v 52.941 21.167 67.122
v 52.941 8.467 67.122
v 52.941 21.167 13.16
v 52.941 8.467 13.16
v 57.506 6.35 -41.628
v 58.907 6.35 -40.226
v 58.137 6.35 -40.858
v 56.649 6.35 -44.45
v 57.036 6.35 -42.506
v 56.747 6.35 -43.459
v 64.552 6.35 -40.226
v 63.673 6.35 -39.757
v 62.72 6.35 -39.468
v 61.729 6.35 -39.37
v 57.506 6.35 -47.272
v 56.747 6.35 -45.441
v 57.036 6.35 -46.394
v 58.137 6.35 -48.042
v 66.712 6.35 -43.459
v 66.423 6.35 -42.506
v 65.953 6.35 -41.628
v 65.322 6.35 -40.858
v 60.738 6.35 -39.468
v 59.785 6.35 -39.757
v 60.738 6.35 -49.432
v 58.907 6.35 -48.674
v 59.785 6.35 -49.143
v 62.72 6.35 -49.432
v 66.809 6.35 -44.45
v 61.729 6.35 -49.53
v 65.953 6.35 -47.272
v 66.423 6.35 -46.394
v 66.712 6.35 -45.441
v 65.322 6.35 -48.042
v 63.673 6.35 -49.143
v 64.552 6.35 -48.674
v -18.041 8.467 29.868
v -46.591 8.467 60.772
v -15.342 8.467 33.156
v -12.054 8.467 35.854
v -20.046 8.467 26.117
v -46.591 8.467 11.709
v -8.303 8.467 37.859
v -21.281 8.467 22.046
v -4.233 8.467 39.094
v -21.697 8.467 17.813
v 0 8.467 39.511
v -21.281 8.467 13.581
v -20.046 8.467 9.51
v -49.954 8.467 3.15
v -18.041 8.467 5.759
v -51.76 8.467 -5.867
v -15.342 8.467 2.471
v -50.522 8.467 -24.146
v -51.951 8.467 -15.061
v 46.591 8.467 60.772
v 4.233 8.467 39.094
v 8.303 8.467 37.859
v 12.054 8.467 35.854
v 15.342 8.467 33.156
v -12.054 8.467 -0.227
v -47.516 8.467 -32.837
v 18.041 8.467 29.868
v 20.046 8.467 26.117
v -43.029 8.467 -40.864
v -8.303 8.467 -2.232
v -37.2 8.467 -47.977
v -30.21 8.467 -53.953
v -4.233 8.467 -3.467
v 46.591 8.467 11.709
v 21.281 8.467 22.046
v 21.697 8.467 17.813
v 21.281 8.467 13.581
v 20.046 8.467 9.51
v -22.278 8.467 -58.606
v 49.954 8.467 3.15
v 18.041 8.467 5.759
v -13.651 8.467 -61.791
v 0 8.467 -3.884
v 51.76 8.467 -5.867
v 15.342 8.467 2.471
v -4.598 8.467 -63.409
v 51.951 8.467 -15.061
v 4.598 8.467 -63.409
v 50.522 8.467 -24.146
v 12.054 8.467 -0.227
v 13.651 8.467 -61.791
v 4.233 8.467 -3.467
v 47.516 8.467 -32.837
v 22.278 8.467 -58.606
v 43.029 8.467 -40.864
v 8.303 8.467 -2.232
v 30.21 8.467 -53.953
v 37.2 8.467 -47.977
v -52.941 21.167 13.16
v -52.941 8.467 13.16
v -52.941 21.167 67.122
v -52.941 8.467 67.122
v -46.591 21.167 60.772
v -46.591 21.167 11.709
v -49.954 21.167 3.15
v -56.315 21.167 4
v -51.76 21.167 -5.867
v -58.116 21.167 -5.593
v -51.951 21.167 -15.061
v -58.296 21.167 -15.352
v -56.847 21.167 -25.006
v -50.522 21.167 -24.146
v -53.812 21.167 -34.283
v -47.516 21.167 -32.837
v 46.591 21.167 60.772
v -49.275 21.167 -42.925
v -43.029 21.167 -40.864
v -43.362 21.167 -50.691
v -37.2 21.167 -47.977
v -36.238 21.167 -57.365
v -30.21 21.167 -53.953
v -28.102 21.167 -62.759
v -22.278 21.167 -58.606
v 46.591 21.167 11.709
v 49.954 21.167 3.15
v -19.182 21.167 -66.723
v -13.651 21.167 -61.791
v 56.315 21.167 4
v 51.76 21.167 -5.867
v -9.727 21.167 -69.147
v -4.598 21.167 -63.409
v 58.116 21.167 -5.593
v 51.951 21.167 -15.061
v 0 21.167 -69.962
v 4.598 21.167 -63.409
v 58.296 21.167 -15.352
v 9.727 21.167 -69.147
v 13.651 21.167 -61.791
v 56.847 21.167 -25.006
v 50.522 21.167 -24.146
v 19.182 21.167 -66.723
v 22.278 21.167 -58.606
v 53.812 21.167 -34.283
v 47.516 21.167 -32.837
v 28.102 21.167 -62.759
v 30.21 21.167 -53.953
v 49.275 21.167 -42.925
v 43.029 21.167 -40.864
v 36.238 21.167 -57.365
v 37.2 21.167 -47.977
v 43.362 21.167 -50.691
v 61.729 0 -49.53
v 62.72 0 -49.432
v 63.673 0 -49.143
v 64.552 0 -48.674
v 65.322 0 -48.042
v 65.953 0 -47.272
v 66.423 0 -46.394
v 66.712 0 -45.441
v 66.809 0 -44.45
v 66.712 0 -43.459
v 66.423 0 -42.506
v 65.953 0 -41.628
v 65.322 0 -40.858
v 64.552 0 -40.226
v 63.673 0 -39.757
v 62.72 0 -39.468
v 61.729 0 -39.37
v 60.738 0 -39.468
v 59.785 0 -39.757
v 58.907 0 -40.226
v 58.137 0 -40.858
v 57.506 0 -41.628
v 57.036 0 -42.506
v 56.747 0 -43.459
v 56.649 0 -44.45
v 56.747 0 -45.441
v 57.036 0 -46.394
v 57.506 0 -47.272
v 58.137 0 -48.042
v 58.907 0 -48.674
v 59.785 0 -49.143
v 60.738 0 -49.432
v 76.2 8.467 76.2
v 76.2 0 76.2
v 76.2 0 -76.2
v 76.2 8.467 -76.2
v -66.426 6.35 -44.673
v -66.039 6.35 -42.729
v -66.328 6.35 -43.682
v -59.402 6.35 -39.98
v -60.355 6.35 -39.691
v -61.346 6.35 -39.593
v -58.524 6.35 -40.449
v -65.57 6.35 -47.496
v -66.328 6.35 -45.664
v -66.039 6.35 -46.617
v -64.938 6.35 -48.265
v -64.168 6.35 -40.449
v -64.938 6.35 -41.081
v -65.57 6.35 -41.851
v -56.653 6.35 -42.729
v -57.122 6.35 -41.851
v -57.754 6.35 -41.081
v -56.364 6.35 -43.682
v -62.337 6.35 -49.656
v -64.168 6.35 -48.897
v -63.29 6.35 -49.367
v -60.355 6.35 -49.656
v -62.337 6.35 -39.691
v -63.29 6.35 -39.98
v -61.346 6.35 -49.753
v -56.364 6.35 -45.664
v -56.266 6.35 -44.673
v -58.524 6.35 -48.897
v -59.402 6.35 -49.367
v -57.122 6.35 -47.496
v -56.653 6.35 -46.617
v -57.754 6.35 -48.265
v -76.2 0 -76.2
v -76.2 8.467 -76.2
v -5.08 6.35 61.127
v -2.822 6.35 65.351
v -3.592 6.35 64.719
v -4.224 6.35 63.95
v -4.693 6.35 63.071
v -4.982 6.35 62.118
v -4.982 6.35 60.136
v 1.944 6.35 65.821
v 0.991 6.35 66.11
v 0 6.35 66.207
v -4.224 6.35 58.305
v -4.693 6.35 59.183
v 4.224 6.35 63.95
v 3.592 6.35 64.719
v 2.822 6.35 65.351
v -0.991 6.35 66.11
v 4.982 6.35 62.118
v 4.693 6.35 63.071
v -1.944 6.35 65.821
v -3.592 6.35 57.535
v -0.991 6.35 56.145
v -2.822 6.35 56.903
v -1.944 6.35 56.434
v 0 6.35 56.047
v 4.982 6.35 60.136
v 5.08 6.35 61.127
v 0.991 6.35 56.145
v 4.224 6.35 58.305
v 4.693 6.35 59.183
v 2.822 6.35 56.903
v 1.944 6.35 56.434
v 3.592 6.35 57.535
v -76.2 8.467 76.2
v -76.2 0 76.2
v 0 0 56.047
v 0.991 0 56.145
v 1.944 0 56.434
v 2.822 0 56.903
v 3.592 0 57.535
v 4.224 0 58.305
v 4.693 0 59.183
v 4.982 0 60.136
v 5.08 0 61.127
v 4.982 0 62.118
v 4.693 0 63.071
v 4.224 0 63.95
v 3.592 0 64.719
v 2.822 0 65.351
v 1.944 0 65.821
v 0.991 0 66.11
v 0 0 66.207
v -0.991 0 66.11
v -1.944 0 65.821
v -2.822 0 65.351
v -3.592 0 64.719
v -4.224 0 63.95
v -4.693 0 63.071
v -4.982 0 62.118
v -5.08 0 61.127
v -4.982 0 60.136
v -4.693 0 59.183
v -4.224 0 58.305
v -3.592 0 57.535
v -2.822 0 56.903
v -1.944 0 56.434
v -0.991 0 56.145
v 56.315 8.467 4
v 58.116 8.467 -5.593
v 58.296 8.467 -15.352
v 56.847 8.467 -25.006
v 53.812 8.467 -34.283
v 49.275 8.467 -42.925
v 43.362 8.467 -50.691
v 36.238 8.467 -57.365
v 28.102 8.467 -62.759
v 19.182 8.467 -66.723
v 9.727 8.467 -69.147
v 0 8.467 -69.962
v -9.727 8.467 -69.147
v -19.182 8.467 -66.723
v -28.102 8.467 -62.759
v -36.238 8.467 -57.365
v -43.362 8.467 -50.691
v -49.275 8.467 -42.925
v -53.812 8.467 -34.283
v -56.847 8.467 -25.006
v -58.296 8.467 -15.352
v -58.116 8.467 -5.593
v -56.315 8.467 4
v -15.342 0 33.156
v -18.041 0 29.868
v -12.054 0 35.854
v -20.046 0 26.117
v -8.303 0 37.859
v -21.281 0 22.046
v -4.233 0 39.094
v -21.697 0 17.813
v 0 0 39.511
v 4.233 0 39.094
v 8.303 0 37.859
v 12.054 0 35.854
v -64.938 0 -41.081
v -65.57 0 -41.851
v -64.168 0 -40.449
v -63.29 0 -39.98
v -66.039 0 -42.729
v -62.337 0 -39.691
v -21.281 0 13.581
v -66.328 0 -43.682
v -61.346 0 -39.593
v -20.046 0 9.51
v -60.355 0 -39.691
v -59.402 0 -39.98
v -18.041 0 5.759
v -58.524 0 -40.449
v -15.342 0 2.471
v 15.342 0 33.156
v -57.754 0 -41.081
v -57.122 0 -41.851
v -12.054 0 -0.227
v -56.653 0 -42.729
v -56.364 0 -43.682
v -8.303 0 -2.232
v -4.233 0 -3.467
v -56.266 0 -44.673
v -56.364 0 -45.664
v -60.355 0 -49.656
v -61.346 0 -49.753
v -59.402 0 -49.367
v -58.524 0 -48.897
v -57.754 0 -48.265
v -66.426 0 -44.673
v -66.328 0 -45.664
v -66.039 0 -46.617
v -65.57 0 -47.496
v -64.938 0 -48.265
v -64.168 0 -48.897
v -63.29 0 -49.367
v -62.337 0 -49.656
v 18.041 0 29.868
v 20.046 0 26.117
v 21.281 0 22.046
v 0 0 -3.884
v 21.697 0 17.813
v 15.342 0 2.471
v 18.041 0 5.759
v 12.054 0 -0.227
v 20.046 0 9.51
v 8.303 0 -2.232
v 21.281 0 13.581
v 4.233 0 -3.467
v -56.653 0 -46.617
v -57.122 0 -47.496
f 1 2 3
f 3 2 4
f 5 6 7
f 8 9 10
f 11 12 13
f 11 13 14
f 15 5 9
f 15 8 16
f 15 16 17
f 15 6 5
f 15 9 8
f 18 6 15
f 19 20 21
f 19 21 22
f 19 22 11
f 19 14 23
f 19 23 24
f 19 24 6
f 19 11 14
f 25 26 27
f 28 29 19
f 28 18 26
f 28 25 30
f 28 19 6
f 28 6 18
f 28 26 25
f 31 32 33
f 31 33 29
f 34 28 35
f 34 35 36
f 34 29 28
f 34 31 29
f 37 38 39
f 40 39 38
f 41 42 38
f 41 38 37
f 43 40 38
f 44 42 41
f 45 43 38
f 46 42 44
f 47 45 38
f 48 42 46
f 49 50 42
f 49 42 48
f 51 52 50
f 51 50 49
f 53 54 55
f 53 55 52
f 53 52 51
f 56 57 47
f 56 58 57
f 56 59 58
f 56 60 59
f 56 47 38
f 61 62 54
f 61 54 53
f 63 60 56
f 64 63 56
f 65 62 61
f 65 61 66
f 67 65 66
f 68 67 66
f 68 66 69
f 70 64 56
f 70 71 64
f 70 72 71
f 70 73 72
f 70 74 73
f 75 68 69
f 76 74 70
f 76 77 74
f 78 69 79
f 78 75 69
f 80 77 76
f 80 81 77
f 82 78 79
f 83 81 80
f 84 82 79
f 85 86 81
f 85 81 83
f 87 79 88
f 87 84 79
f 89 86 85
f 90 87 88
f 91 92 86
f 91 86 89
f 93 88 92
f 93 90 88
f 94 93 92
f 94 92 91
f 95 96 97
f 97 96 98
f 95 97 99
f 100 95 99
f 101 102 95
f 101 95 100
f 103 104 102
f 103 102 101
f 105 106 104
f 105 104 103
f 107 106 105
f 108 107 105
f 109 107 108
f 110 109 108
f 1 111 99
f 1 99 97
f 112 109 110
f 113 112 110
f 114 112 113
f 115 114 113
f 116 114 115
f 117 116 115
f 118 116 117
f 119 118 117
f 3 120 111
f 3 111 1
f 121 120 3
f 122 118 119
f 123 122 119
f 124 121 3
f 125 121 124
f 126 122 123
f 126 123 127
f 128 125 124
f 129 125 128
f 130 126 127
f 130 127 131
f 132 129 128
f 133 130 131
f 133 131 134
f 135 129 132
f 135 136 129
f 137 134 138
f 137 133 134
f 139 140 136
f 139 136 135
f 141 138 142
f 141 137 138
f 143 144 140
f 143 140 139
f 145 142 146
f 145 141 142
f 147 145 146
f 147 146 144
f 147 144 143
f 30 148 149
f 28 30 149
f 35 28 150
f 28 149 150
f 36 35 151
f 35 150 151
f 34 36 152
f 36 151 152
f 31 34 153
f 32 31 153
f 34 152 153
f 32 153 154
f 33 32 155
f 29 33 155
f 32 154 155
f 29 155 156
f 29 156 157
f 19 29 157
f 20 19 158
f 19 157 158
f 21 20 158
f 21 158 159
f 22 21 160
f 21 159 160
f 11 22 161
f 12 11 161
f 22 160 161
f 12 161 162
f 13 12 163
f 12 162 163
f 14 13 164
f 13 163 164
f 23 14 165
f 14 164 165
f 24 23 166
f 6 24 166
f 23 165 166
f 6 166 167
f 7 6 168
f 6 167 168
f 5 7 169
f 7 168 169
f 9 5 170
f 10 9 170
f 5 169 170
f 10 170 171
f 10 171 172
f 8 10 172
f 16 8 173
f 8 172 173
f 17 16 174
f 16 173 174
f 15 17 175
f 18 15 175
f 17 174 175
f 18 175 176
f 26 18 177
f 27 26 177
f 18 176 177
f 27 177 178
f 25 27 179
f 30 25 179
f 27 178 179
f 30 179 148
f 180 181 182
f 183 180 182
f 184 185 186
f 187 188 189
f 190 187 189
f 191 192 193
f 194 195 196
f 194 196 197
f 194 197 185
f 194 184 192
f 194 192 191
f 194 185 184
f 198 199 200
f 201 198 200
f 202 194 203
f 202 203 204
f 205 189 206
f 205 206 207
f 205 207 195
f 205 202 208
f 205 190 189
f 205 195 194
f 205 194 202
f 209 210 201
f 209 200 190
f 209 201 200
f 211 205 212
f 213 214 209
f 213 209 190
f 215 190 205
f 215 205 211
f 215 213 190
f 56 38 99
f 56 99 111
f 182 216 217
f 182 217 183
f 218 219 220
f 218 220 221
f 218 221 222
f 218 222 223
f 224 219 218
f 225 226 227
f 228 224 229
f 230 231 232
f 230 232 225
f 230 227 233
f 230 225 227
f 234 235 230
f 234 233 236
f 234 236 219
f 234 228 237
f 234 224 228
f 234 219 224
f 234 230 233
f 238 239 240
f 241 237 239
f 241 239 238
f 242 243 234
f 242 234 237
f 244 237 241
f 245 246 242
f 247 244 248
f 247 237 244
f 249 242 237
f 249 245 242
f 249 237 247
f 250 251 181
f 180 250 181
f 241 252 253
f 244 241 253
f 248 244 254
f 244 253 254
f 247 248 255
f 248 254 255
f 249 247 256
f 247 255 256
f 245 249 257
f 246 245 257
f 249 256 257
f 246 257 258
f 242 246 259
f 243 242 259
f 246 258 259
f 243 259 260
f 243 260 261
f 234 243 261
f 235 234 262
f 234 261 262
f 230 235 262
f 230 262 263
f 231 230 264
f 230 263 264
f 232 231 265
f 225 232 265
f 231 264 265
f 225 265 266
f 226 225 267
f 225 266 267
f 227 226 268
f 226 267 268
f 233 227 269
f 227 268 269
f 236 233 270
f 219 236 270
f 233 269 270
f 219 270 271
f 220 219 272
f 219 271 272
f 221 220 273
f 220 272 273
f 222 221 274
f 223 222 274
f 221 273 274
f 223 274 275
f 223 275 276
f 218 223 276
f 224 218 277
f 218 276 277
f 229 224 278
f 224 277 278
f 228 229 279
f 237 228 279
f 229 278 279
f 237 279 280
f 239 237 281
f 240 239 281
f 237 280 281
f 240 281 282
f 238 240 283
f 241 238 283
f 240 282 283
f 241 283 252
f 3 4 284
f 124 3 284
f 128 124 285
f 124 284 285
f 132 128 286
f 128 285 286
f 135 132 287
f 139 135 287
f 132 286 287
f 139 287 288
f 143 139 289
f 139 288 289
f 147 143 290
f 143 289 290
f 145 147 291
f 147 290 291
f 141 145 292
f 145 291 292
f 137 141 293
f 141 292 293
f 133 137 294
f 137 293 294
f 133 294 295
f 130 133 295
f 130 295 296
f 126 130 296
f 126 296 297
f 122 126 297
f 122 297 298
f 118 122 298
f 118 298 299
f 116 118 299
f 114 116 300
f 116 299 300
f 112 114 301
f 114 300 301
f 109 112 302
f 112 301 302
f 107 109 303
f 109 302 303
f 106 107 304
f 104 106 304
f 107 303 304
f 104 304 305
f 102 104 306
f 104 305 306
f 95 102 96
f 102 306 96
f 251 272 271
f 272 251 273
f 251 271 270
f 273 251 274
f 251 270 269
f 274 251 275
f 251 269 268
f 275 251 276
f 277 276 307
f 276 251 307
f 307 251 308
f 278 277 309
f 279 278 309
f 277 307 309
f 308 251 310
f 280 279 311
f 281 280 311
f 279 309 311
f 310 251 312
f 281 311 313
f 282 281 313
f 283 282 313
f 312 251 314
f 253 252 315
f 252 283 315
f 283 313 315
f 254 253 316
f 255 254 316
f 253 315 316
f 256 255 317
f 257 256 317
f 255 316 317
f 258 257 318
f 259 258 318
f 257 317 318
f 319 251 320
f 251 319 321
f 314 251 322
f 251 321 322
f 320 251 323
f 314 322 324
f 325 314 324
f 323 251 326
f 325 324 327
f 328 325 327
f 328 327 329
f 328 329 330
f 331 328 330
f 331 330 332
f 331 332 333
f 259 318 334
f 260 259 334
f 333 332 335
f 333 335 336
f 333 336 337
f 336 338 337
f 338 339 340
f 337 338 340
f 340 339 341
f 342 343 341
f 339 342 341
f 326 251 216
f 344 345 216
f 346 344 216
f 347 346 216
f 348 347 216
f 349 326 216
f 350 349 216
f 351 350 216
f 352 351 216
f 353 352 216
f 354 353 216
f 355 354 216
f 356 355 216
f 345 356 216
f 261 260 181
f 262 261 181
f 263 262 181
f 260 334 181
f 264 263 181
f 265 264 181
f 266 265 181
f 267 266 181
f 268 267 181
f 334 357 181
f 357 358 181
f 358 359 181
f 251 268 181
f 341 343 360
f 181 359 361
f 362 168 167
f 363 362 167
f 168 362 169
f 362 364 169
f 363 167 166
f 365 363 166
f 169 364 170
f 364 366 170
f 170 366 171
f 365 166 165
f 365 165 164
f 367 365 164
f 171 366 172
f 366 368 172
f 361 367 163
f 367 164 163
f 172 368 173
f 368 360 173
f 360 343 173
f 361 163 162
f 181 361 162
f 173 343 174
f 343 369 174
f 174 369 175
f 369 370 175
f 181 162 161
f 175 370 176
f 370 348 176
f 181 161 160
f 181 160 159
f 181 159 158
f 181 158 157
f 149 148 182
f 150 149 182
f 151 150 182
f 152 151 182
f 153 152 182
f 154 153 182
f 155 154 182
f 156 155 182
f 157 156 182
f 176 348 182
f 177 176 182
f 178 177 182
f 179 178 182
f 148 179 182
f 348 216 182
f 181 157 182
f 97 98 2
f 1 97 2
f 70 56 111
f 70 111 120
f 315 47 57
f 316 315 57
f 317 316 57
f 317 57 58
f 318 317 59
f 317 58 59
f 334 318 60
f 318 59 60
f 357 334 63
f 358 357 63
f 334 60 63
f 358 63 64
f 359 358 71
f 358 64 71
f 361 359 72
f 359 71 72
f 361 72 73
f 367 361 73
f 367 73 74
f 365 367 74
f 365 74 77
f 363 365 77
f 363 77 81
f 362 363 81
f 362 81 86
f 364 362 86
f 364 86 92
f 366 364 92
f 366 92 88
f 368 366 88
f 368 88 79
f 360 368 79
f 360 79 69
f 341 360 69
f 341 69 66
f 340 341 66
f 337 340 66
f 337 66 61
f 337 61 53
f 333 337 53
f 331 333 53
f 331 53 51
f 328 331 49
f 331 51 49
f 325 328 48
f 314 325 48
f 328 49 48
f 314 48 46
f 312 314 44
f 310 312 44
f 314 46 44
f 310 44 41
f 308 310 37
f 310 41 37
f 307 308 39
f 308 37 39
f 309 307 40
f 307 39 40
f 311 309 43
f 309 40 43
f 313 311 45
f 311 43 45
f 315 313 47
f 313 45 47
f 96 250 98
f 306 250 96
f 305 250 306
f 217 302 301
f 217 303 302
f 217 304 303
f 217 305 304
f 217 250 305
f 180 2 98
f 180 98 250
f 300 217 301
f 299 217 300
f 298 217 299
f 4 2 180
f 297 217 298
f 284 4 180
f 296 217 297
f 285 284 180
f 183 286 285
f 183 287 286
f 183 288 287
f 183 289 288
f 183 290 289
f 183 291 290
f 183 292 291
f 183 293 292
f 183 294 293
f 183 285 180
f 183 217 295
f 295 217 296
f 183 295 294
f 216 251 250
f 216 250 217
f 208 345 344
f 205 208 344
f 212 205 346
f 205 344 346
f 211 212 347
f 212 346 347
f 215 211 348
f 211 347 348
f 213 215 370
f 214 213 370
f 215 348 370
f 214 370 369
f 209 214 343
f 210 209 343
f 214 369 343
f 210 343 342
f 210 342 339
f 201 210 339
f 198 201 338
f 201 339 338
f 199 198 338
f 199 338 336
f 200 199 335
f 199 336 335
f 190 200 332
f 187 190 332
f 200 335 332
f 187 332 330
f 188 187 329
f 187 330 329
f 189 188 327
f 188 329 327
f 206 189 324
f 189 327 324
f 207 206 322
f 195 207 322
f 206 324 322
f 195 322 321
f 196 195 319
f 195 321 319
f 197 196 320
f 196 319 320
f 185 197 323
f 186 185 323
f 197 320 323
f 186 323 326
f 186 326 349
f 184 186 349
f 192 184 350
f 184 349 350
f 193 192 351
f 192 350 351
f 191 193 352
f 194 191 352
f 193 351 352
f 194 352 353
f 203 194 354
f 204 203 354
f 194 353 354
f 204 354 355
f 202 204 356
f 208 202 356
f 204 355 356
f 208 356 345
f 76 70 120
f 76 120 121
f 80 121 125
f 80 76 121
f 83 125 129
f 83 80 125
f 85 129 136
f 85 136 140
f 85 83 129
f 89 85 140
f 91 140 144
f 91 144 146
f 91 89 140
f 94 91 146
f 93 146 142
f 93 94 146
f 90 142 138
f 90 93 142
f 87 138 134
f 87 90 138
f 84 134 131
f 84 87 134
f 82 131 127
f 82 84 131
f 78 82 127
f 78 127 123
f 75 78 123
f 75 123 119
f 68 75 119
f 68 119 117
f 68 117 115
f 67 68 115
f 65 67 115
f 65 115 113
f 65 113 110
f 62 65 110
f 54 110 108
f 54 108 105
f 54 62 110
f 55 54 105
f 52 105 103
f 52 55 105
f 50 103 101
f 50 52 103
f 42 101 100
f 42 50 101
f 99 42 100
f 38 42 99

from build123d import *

# Parameters (mm, degrees)
SKETCH1_W           = 152.4
SKETCH1_H           = 152.4
BOSS_EXTRUDE1_DEPTH = 8.466666667
SKETCH2_R           = 5.08
CUT_EXTRUDE1_DEPTH  = 6.35
BOSS_EXTRUDE3_DEPTH = 12.7
SKETCH4_R           = 21.697410495
CUT_EXTRUDE2_DEPTH  = 12.7


with BuildPart() as part:
    # Sketch1 → Boss-Extrude1 (new body)
    with BuildSketch(Plane(origin=(0, 0, 0), x_dir=(1, 0, 0), z_dir=(0, 1, 0))):
        Rectangle(SKETCH1_W, SKETCH1_H)
    extrude(amount=BOSS_EXTRUDE1_DEPTH)

    # Sketch2 → Cut-Extrude1 (cut)
    with BuildSketch(Plane(origin=(0, 0, 0), x_dir=(-1, 0, 0), z_dir=(0, -1, 0))):
        with Locations(Location((61.345958621, 44.67327441, 0), (0, 0, 90))):
            Circle(SKETCH2_R)
        with Locations(Location((0, -61.127341862, 0), (0, 0, 90))):
            Circle(SKETCH2_R)
        with Locations(Location((-61.729425139, 44.45, 0), (0, 0, 90))):
            Circle(SKETCH2_R)
    extrude(amount=-CUT_EXTRUDE1_DEPTH, mode=Mode.SUBTRACT)

    # Sketch3 → Boss-Extrude3 (add)
    with BuildSketch(Plane(origin=(0, 8.466666667, 0), x_dir=(1, 0, 0), z_dir=(0, 1, 0))):
        with BuildLine():
            Line((-52.940598994, -13.15996673), (-52.940598994, -67.121640926))
            Line((-52.940598994, -67.121640926), (52.940598994, -67.121640926))
            Line((52.940598994, -67.121640926), (52.940598994, -13.15996673))
            ThreePointArc((52.940598994, -13.15996673), (0, 69.962044891), (-52.940598994, -13.15996673))
        make_face()
        with BuildLine():
            Line((-46.590598994, -11.708782736), (-46.590598994, -60.771640926))
            Line((-46.590598994, -60.771640926), (46.590598994, -60.771640926))
            Line((46.590598994, -60.771640926), (46.590598994, -11.708782736))
            ThreePointArc((46.590598994, -11.708782736), (0, 63.612044891), (-46.590598994, -11.708782736))
        make_face(mode=Mode.SUBTRACT)
    extrude(amount=BOSS_EXTRUDE3_DEPTH)

    # Sketch4 → Cut-Extrude2 (cut)
    with BuildSketch(Plane(origin=(0, 8.466666667, 0), x_dir=(1, 0, 0), z_dir=(0, 1, 0))):
        with Locations(Location((0, -17.813493045, 0), (0, 0, 270))):
            Circle(SKETCH4_R)
    extrude(amount=-CUT_EXTRUDE2_DEPTH, mode=Mode.SUBTRACT)


solid = part.part
